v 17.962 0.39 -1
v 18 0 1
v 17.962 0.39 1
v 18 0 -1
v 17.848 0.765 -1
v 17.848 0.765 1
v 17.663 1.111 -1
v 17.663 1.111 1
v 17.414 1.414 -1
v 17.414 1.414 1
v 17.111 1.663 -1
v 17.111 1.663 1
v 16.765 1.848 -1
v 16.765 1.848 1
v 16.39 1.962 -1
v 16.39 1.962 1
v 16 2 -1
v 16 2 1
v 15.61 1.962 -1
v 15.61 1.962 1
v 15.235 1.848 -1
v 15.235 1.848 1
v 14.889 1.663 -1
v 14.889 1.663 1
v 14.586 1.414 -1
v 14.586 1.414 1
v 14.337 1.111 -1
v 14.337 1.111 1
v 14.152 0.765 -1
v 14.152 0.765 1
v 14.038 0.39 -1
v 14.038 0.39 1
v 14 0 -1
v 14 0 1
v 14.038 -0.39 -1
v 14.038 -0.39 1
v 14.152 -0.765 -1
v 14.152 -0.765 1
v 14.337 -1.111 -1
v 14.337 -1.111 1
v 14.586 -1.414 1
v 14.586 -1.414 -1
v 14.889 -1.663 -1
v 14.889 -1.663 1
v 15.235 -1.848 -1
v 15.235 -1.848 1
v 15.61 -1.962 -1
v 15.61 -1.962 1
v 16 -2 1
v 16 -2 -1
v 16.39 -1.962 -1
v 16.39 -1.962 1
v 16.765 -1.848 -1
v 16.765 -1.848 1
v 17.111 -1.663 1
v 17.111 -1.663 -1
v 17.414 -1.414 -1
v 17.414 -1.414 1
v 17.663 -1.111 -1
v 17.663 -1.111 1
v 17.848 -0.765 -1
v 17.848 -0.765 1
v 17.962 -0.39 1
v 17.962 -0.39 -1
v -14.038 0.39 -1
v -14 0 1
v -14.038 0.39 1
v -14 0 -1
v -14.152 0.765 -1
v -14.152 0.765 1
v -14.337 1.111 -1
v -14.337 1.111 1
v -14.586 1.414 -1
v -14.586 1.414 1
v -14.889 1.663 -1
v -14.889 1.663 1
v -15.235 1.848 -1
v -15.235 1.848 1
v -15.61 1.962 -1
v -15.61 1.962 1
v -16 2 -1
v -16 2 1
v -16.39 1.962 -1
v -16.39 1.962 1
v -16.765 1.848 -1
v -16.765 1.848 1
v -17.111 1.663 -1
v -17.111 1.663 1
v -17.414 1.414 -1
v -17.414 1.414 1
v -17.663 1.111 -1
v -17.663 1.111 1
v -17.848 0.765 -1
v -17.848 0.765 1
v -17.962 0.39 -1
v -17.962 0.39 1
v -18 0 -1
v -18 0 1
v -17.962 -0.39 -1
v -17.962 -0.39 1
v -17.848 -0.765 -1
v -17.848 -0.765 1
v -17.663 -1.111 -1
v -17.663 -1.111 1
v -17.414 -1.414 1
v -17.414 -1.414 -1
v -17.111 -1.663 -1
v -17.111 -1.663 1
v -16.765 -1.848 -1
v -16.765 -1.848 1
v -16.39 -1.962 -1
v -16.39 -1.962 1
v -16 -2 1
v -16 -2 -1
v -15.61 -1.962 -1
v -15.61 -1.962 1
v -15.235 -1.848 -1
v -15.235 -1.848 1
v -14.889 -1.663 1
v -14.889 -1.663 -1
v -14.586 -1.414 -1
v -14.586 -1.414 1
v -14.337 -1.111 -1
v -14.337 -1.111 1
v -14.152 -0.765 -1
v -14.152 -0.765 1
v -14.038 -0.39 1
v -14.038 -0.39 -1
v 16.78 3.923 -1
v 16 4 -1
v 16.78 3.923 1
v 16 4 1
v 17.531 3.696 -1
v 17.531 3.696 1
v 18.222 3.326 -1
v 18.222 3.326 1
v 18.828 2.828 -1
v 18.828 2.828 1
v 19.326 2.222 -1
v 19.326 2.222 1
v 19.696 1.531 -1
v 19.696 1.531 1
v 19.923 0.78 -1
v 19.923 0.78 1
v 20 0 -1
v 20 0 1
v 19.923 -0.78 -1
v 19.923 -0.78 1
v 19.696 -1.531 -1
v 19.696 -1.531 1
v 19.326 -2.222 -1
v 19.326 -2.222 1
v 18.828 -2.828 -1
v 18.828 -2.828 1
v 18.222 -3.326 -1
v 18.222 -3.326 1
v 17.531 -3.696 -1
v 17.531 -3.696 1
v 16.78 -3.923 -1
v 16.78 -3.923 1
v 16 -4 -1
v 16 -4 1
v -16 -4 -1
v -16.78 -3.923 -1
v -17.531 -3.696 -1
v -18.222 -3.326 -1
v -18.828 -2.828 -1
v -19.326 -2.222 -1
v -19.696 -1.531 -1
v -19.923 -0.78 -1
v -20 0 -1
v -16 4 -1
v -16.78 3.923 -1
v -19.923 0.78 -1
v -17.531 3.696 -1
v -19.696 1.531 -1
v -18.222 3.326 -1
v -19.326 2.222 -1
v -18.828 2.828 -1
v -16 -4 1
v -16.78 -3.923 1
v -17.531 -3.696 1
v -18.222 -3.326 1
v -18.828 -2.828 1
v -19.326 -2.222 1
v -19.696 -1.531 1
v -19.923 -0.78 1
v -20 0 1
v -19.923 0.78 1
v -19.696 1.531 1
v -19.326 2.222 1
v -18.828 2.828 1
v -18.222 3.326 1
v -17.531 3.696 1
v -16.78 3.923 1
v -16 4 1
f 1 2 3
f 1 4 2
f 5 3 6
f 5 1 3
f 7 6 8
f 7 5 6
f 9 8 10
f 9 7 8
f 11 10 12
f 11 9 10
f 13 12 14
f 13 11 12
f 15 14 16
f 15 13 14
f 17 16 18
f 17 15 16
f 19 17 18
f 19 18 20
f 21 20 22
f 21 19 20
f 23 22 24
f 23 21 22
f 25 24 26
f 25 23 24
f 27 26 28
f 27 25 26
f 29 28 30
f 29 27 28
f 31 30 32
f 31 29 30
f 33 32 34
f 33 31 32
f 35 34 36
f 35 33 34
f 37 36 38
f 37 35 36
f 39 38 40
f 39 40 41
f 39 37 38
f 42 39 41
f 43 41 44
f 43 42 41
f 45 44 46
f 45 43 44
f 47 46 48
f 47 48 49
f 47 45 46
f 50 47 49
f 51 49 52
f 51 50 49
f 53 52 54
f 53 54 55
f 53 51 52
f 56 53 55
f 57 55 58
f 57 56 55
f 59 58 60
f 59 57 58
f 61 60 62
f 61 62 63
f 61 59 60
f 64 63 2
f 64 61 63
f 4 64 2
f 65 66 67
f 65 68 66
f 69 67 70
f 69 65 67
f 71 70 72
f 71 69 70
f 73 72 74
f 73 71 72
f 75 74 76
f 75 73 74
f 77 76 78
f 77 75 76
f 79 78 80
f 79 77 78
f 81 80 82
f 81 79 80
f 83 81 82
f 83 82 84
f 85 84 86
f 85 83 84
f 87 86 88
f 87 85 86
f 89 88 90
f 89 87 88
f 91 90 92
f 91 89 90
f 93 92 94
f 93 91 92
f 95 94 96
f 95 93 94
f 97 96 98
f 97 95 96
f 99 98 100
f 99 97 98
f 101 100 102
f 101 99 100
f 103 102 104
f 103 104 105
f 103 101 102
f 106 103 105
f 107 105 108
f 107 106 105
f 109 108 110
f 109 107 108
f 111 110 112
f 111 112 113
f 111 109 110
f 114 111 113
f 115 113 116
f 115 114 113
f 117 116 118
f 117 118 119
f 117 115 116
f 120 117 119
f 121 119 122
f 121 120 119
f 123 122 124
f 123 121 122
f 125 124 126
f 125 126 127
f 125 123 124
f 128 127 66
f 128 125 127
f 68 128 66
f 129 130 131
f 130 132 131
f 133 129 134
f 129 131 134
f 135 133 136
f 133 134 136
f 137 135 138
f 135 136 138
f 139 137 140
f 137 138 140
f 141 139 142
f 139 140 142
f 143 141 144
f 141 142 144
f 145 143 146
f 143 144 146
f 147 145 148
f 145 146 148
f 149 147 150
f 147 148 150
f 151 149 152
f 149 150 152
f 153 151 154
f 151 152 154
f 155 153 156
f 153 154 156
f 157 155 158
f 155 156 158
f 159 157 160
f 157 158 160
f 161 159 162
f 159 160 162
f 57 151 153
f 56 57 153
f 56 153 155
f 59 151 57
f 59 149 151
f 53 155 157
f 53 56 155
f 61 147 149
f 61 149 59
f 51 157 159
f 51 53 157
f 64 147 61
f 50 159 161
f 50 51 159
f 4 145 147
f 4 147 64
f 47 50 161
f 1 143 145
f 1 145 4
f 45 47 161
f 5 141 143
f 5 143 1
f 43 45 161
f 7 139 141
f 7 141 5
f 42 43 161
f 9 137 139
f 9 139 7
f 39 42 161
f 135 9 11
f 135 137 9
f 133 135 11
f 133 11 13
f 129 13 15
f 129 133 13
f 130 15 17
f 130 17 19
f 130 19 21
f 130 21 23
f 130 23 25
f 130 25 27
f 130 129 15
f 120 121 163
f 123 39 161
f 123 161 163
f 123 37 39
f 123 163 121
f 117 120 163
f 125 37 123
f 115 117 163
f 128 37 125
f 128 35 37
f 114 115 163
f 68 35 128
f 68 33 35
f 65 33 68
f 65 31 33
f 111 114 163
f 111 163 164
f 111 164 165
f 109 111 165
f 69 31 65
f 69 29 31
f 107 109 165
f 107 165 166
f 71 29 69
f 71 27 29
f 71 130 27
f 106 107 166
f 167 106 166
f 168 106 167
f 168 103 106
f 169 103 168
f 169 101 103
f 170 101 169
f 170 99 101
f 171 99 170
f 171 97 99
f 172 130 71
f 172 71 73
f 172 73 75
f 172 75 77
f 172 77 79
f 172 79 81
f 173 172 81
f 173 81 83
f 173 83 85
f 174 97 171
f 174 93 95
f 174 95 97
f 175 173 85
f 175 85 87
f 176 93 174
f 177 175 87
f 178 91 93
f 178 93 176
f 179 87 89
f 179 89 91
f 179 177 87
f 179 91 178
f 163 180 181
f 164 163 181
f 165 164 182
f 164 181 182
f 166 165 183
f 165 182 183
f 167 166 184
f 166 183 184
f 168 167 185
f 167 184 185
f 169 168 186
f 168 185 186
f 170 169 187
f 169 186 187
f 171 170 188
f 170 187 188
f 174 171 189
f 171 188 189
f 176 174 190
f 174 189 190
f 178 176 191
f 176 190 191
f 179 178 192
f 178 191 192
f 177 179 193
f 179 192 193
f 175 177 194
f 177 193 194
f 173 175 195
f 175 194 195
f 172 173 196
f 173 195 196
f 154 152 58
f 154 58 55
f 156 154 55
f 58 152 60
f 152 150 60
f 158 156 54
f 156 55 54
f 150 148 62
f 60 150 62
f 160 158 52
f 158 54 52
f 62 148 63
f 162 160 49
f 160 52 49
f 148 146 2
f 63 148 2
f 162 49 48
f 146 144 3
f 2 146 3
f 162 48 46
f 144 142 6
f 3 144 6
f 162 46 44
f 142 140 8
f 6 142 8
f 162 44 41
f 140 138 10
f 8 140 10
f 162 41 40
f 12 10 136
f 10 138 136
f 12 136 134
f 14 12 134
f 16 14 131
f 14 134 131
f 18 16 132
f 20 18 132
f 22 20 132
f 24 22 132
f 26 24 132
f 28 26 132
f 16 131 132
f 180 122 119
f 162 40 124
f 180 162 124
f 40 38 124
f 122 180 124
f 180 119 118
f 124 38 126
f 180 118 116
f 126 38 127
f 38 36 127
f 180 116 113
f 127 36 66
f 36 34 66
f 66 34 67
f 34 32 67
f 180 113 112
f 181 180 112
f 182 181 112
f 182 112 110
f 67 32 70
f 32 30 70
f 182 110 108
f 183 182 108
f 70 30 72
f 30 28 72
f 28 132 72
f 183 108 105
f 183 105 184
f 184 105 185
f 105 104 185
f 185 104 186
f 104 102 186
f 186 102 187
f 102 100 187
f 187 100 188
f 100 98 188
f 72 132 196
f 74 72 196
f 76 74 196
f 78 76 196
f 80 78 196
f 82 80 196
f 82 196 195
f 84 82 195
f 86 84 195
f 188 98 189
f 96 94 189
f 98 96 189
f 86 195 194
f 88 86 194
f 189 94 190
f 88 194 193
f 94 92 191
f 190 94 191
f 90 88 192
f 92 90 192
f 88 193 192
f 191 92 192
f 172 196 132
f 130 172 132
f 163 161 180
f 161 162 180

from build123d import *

# Parameters (mm, degrees)
SKETCH1_R           = 2
BOSS_EXTRUDE2_DEPTH = 1


with BuildPart() as part:
    # Sketch1 → Boss-Extrude2 (new body, symmetric)
    with BuildSketch(Plane.XY):
        with BuildLine():
            Line((-16, 4), (16, 4))
            ThreePointArc((16, 4), (20, 0), (16, -4))
            Line((16, -4), (-16, -4))
            ThreePointArc((-16, -4), (-20, 0), (-16, 4))
        make_face()
        with Locations((-16, 0)):
            Circle(SKETCH1_R, mode=Mode.SUBTRACT)
        with Locations((16, 0)):
            Circle(SKETCH1_R, mode=Mode.SUBTRACT)
    extrude(amount=BOSS_EXTRUDE2_DEPTH, both=True)


solid = part.part
